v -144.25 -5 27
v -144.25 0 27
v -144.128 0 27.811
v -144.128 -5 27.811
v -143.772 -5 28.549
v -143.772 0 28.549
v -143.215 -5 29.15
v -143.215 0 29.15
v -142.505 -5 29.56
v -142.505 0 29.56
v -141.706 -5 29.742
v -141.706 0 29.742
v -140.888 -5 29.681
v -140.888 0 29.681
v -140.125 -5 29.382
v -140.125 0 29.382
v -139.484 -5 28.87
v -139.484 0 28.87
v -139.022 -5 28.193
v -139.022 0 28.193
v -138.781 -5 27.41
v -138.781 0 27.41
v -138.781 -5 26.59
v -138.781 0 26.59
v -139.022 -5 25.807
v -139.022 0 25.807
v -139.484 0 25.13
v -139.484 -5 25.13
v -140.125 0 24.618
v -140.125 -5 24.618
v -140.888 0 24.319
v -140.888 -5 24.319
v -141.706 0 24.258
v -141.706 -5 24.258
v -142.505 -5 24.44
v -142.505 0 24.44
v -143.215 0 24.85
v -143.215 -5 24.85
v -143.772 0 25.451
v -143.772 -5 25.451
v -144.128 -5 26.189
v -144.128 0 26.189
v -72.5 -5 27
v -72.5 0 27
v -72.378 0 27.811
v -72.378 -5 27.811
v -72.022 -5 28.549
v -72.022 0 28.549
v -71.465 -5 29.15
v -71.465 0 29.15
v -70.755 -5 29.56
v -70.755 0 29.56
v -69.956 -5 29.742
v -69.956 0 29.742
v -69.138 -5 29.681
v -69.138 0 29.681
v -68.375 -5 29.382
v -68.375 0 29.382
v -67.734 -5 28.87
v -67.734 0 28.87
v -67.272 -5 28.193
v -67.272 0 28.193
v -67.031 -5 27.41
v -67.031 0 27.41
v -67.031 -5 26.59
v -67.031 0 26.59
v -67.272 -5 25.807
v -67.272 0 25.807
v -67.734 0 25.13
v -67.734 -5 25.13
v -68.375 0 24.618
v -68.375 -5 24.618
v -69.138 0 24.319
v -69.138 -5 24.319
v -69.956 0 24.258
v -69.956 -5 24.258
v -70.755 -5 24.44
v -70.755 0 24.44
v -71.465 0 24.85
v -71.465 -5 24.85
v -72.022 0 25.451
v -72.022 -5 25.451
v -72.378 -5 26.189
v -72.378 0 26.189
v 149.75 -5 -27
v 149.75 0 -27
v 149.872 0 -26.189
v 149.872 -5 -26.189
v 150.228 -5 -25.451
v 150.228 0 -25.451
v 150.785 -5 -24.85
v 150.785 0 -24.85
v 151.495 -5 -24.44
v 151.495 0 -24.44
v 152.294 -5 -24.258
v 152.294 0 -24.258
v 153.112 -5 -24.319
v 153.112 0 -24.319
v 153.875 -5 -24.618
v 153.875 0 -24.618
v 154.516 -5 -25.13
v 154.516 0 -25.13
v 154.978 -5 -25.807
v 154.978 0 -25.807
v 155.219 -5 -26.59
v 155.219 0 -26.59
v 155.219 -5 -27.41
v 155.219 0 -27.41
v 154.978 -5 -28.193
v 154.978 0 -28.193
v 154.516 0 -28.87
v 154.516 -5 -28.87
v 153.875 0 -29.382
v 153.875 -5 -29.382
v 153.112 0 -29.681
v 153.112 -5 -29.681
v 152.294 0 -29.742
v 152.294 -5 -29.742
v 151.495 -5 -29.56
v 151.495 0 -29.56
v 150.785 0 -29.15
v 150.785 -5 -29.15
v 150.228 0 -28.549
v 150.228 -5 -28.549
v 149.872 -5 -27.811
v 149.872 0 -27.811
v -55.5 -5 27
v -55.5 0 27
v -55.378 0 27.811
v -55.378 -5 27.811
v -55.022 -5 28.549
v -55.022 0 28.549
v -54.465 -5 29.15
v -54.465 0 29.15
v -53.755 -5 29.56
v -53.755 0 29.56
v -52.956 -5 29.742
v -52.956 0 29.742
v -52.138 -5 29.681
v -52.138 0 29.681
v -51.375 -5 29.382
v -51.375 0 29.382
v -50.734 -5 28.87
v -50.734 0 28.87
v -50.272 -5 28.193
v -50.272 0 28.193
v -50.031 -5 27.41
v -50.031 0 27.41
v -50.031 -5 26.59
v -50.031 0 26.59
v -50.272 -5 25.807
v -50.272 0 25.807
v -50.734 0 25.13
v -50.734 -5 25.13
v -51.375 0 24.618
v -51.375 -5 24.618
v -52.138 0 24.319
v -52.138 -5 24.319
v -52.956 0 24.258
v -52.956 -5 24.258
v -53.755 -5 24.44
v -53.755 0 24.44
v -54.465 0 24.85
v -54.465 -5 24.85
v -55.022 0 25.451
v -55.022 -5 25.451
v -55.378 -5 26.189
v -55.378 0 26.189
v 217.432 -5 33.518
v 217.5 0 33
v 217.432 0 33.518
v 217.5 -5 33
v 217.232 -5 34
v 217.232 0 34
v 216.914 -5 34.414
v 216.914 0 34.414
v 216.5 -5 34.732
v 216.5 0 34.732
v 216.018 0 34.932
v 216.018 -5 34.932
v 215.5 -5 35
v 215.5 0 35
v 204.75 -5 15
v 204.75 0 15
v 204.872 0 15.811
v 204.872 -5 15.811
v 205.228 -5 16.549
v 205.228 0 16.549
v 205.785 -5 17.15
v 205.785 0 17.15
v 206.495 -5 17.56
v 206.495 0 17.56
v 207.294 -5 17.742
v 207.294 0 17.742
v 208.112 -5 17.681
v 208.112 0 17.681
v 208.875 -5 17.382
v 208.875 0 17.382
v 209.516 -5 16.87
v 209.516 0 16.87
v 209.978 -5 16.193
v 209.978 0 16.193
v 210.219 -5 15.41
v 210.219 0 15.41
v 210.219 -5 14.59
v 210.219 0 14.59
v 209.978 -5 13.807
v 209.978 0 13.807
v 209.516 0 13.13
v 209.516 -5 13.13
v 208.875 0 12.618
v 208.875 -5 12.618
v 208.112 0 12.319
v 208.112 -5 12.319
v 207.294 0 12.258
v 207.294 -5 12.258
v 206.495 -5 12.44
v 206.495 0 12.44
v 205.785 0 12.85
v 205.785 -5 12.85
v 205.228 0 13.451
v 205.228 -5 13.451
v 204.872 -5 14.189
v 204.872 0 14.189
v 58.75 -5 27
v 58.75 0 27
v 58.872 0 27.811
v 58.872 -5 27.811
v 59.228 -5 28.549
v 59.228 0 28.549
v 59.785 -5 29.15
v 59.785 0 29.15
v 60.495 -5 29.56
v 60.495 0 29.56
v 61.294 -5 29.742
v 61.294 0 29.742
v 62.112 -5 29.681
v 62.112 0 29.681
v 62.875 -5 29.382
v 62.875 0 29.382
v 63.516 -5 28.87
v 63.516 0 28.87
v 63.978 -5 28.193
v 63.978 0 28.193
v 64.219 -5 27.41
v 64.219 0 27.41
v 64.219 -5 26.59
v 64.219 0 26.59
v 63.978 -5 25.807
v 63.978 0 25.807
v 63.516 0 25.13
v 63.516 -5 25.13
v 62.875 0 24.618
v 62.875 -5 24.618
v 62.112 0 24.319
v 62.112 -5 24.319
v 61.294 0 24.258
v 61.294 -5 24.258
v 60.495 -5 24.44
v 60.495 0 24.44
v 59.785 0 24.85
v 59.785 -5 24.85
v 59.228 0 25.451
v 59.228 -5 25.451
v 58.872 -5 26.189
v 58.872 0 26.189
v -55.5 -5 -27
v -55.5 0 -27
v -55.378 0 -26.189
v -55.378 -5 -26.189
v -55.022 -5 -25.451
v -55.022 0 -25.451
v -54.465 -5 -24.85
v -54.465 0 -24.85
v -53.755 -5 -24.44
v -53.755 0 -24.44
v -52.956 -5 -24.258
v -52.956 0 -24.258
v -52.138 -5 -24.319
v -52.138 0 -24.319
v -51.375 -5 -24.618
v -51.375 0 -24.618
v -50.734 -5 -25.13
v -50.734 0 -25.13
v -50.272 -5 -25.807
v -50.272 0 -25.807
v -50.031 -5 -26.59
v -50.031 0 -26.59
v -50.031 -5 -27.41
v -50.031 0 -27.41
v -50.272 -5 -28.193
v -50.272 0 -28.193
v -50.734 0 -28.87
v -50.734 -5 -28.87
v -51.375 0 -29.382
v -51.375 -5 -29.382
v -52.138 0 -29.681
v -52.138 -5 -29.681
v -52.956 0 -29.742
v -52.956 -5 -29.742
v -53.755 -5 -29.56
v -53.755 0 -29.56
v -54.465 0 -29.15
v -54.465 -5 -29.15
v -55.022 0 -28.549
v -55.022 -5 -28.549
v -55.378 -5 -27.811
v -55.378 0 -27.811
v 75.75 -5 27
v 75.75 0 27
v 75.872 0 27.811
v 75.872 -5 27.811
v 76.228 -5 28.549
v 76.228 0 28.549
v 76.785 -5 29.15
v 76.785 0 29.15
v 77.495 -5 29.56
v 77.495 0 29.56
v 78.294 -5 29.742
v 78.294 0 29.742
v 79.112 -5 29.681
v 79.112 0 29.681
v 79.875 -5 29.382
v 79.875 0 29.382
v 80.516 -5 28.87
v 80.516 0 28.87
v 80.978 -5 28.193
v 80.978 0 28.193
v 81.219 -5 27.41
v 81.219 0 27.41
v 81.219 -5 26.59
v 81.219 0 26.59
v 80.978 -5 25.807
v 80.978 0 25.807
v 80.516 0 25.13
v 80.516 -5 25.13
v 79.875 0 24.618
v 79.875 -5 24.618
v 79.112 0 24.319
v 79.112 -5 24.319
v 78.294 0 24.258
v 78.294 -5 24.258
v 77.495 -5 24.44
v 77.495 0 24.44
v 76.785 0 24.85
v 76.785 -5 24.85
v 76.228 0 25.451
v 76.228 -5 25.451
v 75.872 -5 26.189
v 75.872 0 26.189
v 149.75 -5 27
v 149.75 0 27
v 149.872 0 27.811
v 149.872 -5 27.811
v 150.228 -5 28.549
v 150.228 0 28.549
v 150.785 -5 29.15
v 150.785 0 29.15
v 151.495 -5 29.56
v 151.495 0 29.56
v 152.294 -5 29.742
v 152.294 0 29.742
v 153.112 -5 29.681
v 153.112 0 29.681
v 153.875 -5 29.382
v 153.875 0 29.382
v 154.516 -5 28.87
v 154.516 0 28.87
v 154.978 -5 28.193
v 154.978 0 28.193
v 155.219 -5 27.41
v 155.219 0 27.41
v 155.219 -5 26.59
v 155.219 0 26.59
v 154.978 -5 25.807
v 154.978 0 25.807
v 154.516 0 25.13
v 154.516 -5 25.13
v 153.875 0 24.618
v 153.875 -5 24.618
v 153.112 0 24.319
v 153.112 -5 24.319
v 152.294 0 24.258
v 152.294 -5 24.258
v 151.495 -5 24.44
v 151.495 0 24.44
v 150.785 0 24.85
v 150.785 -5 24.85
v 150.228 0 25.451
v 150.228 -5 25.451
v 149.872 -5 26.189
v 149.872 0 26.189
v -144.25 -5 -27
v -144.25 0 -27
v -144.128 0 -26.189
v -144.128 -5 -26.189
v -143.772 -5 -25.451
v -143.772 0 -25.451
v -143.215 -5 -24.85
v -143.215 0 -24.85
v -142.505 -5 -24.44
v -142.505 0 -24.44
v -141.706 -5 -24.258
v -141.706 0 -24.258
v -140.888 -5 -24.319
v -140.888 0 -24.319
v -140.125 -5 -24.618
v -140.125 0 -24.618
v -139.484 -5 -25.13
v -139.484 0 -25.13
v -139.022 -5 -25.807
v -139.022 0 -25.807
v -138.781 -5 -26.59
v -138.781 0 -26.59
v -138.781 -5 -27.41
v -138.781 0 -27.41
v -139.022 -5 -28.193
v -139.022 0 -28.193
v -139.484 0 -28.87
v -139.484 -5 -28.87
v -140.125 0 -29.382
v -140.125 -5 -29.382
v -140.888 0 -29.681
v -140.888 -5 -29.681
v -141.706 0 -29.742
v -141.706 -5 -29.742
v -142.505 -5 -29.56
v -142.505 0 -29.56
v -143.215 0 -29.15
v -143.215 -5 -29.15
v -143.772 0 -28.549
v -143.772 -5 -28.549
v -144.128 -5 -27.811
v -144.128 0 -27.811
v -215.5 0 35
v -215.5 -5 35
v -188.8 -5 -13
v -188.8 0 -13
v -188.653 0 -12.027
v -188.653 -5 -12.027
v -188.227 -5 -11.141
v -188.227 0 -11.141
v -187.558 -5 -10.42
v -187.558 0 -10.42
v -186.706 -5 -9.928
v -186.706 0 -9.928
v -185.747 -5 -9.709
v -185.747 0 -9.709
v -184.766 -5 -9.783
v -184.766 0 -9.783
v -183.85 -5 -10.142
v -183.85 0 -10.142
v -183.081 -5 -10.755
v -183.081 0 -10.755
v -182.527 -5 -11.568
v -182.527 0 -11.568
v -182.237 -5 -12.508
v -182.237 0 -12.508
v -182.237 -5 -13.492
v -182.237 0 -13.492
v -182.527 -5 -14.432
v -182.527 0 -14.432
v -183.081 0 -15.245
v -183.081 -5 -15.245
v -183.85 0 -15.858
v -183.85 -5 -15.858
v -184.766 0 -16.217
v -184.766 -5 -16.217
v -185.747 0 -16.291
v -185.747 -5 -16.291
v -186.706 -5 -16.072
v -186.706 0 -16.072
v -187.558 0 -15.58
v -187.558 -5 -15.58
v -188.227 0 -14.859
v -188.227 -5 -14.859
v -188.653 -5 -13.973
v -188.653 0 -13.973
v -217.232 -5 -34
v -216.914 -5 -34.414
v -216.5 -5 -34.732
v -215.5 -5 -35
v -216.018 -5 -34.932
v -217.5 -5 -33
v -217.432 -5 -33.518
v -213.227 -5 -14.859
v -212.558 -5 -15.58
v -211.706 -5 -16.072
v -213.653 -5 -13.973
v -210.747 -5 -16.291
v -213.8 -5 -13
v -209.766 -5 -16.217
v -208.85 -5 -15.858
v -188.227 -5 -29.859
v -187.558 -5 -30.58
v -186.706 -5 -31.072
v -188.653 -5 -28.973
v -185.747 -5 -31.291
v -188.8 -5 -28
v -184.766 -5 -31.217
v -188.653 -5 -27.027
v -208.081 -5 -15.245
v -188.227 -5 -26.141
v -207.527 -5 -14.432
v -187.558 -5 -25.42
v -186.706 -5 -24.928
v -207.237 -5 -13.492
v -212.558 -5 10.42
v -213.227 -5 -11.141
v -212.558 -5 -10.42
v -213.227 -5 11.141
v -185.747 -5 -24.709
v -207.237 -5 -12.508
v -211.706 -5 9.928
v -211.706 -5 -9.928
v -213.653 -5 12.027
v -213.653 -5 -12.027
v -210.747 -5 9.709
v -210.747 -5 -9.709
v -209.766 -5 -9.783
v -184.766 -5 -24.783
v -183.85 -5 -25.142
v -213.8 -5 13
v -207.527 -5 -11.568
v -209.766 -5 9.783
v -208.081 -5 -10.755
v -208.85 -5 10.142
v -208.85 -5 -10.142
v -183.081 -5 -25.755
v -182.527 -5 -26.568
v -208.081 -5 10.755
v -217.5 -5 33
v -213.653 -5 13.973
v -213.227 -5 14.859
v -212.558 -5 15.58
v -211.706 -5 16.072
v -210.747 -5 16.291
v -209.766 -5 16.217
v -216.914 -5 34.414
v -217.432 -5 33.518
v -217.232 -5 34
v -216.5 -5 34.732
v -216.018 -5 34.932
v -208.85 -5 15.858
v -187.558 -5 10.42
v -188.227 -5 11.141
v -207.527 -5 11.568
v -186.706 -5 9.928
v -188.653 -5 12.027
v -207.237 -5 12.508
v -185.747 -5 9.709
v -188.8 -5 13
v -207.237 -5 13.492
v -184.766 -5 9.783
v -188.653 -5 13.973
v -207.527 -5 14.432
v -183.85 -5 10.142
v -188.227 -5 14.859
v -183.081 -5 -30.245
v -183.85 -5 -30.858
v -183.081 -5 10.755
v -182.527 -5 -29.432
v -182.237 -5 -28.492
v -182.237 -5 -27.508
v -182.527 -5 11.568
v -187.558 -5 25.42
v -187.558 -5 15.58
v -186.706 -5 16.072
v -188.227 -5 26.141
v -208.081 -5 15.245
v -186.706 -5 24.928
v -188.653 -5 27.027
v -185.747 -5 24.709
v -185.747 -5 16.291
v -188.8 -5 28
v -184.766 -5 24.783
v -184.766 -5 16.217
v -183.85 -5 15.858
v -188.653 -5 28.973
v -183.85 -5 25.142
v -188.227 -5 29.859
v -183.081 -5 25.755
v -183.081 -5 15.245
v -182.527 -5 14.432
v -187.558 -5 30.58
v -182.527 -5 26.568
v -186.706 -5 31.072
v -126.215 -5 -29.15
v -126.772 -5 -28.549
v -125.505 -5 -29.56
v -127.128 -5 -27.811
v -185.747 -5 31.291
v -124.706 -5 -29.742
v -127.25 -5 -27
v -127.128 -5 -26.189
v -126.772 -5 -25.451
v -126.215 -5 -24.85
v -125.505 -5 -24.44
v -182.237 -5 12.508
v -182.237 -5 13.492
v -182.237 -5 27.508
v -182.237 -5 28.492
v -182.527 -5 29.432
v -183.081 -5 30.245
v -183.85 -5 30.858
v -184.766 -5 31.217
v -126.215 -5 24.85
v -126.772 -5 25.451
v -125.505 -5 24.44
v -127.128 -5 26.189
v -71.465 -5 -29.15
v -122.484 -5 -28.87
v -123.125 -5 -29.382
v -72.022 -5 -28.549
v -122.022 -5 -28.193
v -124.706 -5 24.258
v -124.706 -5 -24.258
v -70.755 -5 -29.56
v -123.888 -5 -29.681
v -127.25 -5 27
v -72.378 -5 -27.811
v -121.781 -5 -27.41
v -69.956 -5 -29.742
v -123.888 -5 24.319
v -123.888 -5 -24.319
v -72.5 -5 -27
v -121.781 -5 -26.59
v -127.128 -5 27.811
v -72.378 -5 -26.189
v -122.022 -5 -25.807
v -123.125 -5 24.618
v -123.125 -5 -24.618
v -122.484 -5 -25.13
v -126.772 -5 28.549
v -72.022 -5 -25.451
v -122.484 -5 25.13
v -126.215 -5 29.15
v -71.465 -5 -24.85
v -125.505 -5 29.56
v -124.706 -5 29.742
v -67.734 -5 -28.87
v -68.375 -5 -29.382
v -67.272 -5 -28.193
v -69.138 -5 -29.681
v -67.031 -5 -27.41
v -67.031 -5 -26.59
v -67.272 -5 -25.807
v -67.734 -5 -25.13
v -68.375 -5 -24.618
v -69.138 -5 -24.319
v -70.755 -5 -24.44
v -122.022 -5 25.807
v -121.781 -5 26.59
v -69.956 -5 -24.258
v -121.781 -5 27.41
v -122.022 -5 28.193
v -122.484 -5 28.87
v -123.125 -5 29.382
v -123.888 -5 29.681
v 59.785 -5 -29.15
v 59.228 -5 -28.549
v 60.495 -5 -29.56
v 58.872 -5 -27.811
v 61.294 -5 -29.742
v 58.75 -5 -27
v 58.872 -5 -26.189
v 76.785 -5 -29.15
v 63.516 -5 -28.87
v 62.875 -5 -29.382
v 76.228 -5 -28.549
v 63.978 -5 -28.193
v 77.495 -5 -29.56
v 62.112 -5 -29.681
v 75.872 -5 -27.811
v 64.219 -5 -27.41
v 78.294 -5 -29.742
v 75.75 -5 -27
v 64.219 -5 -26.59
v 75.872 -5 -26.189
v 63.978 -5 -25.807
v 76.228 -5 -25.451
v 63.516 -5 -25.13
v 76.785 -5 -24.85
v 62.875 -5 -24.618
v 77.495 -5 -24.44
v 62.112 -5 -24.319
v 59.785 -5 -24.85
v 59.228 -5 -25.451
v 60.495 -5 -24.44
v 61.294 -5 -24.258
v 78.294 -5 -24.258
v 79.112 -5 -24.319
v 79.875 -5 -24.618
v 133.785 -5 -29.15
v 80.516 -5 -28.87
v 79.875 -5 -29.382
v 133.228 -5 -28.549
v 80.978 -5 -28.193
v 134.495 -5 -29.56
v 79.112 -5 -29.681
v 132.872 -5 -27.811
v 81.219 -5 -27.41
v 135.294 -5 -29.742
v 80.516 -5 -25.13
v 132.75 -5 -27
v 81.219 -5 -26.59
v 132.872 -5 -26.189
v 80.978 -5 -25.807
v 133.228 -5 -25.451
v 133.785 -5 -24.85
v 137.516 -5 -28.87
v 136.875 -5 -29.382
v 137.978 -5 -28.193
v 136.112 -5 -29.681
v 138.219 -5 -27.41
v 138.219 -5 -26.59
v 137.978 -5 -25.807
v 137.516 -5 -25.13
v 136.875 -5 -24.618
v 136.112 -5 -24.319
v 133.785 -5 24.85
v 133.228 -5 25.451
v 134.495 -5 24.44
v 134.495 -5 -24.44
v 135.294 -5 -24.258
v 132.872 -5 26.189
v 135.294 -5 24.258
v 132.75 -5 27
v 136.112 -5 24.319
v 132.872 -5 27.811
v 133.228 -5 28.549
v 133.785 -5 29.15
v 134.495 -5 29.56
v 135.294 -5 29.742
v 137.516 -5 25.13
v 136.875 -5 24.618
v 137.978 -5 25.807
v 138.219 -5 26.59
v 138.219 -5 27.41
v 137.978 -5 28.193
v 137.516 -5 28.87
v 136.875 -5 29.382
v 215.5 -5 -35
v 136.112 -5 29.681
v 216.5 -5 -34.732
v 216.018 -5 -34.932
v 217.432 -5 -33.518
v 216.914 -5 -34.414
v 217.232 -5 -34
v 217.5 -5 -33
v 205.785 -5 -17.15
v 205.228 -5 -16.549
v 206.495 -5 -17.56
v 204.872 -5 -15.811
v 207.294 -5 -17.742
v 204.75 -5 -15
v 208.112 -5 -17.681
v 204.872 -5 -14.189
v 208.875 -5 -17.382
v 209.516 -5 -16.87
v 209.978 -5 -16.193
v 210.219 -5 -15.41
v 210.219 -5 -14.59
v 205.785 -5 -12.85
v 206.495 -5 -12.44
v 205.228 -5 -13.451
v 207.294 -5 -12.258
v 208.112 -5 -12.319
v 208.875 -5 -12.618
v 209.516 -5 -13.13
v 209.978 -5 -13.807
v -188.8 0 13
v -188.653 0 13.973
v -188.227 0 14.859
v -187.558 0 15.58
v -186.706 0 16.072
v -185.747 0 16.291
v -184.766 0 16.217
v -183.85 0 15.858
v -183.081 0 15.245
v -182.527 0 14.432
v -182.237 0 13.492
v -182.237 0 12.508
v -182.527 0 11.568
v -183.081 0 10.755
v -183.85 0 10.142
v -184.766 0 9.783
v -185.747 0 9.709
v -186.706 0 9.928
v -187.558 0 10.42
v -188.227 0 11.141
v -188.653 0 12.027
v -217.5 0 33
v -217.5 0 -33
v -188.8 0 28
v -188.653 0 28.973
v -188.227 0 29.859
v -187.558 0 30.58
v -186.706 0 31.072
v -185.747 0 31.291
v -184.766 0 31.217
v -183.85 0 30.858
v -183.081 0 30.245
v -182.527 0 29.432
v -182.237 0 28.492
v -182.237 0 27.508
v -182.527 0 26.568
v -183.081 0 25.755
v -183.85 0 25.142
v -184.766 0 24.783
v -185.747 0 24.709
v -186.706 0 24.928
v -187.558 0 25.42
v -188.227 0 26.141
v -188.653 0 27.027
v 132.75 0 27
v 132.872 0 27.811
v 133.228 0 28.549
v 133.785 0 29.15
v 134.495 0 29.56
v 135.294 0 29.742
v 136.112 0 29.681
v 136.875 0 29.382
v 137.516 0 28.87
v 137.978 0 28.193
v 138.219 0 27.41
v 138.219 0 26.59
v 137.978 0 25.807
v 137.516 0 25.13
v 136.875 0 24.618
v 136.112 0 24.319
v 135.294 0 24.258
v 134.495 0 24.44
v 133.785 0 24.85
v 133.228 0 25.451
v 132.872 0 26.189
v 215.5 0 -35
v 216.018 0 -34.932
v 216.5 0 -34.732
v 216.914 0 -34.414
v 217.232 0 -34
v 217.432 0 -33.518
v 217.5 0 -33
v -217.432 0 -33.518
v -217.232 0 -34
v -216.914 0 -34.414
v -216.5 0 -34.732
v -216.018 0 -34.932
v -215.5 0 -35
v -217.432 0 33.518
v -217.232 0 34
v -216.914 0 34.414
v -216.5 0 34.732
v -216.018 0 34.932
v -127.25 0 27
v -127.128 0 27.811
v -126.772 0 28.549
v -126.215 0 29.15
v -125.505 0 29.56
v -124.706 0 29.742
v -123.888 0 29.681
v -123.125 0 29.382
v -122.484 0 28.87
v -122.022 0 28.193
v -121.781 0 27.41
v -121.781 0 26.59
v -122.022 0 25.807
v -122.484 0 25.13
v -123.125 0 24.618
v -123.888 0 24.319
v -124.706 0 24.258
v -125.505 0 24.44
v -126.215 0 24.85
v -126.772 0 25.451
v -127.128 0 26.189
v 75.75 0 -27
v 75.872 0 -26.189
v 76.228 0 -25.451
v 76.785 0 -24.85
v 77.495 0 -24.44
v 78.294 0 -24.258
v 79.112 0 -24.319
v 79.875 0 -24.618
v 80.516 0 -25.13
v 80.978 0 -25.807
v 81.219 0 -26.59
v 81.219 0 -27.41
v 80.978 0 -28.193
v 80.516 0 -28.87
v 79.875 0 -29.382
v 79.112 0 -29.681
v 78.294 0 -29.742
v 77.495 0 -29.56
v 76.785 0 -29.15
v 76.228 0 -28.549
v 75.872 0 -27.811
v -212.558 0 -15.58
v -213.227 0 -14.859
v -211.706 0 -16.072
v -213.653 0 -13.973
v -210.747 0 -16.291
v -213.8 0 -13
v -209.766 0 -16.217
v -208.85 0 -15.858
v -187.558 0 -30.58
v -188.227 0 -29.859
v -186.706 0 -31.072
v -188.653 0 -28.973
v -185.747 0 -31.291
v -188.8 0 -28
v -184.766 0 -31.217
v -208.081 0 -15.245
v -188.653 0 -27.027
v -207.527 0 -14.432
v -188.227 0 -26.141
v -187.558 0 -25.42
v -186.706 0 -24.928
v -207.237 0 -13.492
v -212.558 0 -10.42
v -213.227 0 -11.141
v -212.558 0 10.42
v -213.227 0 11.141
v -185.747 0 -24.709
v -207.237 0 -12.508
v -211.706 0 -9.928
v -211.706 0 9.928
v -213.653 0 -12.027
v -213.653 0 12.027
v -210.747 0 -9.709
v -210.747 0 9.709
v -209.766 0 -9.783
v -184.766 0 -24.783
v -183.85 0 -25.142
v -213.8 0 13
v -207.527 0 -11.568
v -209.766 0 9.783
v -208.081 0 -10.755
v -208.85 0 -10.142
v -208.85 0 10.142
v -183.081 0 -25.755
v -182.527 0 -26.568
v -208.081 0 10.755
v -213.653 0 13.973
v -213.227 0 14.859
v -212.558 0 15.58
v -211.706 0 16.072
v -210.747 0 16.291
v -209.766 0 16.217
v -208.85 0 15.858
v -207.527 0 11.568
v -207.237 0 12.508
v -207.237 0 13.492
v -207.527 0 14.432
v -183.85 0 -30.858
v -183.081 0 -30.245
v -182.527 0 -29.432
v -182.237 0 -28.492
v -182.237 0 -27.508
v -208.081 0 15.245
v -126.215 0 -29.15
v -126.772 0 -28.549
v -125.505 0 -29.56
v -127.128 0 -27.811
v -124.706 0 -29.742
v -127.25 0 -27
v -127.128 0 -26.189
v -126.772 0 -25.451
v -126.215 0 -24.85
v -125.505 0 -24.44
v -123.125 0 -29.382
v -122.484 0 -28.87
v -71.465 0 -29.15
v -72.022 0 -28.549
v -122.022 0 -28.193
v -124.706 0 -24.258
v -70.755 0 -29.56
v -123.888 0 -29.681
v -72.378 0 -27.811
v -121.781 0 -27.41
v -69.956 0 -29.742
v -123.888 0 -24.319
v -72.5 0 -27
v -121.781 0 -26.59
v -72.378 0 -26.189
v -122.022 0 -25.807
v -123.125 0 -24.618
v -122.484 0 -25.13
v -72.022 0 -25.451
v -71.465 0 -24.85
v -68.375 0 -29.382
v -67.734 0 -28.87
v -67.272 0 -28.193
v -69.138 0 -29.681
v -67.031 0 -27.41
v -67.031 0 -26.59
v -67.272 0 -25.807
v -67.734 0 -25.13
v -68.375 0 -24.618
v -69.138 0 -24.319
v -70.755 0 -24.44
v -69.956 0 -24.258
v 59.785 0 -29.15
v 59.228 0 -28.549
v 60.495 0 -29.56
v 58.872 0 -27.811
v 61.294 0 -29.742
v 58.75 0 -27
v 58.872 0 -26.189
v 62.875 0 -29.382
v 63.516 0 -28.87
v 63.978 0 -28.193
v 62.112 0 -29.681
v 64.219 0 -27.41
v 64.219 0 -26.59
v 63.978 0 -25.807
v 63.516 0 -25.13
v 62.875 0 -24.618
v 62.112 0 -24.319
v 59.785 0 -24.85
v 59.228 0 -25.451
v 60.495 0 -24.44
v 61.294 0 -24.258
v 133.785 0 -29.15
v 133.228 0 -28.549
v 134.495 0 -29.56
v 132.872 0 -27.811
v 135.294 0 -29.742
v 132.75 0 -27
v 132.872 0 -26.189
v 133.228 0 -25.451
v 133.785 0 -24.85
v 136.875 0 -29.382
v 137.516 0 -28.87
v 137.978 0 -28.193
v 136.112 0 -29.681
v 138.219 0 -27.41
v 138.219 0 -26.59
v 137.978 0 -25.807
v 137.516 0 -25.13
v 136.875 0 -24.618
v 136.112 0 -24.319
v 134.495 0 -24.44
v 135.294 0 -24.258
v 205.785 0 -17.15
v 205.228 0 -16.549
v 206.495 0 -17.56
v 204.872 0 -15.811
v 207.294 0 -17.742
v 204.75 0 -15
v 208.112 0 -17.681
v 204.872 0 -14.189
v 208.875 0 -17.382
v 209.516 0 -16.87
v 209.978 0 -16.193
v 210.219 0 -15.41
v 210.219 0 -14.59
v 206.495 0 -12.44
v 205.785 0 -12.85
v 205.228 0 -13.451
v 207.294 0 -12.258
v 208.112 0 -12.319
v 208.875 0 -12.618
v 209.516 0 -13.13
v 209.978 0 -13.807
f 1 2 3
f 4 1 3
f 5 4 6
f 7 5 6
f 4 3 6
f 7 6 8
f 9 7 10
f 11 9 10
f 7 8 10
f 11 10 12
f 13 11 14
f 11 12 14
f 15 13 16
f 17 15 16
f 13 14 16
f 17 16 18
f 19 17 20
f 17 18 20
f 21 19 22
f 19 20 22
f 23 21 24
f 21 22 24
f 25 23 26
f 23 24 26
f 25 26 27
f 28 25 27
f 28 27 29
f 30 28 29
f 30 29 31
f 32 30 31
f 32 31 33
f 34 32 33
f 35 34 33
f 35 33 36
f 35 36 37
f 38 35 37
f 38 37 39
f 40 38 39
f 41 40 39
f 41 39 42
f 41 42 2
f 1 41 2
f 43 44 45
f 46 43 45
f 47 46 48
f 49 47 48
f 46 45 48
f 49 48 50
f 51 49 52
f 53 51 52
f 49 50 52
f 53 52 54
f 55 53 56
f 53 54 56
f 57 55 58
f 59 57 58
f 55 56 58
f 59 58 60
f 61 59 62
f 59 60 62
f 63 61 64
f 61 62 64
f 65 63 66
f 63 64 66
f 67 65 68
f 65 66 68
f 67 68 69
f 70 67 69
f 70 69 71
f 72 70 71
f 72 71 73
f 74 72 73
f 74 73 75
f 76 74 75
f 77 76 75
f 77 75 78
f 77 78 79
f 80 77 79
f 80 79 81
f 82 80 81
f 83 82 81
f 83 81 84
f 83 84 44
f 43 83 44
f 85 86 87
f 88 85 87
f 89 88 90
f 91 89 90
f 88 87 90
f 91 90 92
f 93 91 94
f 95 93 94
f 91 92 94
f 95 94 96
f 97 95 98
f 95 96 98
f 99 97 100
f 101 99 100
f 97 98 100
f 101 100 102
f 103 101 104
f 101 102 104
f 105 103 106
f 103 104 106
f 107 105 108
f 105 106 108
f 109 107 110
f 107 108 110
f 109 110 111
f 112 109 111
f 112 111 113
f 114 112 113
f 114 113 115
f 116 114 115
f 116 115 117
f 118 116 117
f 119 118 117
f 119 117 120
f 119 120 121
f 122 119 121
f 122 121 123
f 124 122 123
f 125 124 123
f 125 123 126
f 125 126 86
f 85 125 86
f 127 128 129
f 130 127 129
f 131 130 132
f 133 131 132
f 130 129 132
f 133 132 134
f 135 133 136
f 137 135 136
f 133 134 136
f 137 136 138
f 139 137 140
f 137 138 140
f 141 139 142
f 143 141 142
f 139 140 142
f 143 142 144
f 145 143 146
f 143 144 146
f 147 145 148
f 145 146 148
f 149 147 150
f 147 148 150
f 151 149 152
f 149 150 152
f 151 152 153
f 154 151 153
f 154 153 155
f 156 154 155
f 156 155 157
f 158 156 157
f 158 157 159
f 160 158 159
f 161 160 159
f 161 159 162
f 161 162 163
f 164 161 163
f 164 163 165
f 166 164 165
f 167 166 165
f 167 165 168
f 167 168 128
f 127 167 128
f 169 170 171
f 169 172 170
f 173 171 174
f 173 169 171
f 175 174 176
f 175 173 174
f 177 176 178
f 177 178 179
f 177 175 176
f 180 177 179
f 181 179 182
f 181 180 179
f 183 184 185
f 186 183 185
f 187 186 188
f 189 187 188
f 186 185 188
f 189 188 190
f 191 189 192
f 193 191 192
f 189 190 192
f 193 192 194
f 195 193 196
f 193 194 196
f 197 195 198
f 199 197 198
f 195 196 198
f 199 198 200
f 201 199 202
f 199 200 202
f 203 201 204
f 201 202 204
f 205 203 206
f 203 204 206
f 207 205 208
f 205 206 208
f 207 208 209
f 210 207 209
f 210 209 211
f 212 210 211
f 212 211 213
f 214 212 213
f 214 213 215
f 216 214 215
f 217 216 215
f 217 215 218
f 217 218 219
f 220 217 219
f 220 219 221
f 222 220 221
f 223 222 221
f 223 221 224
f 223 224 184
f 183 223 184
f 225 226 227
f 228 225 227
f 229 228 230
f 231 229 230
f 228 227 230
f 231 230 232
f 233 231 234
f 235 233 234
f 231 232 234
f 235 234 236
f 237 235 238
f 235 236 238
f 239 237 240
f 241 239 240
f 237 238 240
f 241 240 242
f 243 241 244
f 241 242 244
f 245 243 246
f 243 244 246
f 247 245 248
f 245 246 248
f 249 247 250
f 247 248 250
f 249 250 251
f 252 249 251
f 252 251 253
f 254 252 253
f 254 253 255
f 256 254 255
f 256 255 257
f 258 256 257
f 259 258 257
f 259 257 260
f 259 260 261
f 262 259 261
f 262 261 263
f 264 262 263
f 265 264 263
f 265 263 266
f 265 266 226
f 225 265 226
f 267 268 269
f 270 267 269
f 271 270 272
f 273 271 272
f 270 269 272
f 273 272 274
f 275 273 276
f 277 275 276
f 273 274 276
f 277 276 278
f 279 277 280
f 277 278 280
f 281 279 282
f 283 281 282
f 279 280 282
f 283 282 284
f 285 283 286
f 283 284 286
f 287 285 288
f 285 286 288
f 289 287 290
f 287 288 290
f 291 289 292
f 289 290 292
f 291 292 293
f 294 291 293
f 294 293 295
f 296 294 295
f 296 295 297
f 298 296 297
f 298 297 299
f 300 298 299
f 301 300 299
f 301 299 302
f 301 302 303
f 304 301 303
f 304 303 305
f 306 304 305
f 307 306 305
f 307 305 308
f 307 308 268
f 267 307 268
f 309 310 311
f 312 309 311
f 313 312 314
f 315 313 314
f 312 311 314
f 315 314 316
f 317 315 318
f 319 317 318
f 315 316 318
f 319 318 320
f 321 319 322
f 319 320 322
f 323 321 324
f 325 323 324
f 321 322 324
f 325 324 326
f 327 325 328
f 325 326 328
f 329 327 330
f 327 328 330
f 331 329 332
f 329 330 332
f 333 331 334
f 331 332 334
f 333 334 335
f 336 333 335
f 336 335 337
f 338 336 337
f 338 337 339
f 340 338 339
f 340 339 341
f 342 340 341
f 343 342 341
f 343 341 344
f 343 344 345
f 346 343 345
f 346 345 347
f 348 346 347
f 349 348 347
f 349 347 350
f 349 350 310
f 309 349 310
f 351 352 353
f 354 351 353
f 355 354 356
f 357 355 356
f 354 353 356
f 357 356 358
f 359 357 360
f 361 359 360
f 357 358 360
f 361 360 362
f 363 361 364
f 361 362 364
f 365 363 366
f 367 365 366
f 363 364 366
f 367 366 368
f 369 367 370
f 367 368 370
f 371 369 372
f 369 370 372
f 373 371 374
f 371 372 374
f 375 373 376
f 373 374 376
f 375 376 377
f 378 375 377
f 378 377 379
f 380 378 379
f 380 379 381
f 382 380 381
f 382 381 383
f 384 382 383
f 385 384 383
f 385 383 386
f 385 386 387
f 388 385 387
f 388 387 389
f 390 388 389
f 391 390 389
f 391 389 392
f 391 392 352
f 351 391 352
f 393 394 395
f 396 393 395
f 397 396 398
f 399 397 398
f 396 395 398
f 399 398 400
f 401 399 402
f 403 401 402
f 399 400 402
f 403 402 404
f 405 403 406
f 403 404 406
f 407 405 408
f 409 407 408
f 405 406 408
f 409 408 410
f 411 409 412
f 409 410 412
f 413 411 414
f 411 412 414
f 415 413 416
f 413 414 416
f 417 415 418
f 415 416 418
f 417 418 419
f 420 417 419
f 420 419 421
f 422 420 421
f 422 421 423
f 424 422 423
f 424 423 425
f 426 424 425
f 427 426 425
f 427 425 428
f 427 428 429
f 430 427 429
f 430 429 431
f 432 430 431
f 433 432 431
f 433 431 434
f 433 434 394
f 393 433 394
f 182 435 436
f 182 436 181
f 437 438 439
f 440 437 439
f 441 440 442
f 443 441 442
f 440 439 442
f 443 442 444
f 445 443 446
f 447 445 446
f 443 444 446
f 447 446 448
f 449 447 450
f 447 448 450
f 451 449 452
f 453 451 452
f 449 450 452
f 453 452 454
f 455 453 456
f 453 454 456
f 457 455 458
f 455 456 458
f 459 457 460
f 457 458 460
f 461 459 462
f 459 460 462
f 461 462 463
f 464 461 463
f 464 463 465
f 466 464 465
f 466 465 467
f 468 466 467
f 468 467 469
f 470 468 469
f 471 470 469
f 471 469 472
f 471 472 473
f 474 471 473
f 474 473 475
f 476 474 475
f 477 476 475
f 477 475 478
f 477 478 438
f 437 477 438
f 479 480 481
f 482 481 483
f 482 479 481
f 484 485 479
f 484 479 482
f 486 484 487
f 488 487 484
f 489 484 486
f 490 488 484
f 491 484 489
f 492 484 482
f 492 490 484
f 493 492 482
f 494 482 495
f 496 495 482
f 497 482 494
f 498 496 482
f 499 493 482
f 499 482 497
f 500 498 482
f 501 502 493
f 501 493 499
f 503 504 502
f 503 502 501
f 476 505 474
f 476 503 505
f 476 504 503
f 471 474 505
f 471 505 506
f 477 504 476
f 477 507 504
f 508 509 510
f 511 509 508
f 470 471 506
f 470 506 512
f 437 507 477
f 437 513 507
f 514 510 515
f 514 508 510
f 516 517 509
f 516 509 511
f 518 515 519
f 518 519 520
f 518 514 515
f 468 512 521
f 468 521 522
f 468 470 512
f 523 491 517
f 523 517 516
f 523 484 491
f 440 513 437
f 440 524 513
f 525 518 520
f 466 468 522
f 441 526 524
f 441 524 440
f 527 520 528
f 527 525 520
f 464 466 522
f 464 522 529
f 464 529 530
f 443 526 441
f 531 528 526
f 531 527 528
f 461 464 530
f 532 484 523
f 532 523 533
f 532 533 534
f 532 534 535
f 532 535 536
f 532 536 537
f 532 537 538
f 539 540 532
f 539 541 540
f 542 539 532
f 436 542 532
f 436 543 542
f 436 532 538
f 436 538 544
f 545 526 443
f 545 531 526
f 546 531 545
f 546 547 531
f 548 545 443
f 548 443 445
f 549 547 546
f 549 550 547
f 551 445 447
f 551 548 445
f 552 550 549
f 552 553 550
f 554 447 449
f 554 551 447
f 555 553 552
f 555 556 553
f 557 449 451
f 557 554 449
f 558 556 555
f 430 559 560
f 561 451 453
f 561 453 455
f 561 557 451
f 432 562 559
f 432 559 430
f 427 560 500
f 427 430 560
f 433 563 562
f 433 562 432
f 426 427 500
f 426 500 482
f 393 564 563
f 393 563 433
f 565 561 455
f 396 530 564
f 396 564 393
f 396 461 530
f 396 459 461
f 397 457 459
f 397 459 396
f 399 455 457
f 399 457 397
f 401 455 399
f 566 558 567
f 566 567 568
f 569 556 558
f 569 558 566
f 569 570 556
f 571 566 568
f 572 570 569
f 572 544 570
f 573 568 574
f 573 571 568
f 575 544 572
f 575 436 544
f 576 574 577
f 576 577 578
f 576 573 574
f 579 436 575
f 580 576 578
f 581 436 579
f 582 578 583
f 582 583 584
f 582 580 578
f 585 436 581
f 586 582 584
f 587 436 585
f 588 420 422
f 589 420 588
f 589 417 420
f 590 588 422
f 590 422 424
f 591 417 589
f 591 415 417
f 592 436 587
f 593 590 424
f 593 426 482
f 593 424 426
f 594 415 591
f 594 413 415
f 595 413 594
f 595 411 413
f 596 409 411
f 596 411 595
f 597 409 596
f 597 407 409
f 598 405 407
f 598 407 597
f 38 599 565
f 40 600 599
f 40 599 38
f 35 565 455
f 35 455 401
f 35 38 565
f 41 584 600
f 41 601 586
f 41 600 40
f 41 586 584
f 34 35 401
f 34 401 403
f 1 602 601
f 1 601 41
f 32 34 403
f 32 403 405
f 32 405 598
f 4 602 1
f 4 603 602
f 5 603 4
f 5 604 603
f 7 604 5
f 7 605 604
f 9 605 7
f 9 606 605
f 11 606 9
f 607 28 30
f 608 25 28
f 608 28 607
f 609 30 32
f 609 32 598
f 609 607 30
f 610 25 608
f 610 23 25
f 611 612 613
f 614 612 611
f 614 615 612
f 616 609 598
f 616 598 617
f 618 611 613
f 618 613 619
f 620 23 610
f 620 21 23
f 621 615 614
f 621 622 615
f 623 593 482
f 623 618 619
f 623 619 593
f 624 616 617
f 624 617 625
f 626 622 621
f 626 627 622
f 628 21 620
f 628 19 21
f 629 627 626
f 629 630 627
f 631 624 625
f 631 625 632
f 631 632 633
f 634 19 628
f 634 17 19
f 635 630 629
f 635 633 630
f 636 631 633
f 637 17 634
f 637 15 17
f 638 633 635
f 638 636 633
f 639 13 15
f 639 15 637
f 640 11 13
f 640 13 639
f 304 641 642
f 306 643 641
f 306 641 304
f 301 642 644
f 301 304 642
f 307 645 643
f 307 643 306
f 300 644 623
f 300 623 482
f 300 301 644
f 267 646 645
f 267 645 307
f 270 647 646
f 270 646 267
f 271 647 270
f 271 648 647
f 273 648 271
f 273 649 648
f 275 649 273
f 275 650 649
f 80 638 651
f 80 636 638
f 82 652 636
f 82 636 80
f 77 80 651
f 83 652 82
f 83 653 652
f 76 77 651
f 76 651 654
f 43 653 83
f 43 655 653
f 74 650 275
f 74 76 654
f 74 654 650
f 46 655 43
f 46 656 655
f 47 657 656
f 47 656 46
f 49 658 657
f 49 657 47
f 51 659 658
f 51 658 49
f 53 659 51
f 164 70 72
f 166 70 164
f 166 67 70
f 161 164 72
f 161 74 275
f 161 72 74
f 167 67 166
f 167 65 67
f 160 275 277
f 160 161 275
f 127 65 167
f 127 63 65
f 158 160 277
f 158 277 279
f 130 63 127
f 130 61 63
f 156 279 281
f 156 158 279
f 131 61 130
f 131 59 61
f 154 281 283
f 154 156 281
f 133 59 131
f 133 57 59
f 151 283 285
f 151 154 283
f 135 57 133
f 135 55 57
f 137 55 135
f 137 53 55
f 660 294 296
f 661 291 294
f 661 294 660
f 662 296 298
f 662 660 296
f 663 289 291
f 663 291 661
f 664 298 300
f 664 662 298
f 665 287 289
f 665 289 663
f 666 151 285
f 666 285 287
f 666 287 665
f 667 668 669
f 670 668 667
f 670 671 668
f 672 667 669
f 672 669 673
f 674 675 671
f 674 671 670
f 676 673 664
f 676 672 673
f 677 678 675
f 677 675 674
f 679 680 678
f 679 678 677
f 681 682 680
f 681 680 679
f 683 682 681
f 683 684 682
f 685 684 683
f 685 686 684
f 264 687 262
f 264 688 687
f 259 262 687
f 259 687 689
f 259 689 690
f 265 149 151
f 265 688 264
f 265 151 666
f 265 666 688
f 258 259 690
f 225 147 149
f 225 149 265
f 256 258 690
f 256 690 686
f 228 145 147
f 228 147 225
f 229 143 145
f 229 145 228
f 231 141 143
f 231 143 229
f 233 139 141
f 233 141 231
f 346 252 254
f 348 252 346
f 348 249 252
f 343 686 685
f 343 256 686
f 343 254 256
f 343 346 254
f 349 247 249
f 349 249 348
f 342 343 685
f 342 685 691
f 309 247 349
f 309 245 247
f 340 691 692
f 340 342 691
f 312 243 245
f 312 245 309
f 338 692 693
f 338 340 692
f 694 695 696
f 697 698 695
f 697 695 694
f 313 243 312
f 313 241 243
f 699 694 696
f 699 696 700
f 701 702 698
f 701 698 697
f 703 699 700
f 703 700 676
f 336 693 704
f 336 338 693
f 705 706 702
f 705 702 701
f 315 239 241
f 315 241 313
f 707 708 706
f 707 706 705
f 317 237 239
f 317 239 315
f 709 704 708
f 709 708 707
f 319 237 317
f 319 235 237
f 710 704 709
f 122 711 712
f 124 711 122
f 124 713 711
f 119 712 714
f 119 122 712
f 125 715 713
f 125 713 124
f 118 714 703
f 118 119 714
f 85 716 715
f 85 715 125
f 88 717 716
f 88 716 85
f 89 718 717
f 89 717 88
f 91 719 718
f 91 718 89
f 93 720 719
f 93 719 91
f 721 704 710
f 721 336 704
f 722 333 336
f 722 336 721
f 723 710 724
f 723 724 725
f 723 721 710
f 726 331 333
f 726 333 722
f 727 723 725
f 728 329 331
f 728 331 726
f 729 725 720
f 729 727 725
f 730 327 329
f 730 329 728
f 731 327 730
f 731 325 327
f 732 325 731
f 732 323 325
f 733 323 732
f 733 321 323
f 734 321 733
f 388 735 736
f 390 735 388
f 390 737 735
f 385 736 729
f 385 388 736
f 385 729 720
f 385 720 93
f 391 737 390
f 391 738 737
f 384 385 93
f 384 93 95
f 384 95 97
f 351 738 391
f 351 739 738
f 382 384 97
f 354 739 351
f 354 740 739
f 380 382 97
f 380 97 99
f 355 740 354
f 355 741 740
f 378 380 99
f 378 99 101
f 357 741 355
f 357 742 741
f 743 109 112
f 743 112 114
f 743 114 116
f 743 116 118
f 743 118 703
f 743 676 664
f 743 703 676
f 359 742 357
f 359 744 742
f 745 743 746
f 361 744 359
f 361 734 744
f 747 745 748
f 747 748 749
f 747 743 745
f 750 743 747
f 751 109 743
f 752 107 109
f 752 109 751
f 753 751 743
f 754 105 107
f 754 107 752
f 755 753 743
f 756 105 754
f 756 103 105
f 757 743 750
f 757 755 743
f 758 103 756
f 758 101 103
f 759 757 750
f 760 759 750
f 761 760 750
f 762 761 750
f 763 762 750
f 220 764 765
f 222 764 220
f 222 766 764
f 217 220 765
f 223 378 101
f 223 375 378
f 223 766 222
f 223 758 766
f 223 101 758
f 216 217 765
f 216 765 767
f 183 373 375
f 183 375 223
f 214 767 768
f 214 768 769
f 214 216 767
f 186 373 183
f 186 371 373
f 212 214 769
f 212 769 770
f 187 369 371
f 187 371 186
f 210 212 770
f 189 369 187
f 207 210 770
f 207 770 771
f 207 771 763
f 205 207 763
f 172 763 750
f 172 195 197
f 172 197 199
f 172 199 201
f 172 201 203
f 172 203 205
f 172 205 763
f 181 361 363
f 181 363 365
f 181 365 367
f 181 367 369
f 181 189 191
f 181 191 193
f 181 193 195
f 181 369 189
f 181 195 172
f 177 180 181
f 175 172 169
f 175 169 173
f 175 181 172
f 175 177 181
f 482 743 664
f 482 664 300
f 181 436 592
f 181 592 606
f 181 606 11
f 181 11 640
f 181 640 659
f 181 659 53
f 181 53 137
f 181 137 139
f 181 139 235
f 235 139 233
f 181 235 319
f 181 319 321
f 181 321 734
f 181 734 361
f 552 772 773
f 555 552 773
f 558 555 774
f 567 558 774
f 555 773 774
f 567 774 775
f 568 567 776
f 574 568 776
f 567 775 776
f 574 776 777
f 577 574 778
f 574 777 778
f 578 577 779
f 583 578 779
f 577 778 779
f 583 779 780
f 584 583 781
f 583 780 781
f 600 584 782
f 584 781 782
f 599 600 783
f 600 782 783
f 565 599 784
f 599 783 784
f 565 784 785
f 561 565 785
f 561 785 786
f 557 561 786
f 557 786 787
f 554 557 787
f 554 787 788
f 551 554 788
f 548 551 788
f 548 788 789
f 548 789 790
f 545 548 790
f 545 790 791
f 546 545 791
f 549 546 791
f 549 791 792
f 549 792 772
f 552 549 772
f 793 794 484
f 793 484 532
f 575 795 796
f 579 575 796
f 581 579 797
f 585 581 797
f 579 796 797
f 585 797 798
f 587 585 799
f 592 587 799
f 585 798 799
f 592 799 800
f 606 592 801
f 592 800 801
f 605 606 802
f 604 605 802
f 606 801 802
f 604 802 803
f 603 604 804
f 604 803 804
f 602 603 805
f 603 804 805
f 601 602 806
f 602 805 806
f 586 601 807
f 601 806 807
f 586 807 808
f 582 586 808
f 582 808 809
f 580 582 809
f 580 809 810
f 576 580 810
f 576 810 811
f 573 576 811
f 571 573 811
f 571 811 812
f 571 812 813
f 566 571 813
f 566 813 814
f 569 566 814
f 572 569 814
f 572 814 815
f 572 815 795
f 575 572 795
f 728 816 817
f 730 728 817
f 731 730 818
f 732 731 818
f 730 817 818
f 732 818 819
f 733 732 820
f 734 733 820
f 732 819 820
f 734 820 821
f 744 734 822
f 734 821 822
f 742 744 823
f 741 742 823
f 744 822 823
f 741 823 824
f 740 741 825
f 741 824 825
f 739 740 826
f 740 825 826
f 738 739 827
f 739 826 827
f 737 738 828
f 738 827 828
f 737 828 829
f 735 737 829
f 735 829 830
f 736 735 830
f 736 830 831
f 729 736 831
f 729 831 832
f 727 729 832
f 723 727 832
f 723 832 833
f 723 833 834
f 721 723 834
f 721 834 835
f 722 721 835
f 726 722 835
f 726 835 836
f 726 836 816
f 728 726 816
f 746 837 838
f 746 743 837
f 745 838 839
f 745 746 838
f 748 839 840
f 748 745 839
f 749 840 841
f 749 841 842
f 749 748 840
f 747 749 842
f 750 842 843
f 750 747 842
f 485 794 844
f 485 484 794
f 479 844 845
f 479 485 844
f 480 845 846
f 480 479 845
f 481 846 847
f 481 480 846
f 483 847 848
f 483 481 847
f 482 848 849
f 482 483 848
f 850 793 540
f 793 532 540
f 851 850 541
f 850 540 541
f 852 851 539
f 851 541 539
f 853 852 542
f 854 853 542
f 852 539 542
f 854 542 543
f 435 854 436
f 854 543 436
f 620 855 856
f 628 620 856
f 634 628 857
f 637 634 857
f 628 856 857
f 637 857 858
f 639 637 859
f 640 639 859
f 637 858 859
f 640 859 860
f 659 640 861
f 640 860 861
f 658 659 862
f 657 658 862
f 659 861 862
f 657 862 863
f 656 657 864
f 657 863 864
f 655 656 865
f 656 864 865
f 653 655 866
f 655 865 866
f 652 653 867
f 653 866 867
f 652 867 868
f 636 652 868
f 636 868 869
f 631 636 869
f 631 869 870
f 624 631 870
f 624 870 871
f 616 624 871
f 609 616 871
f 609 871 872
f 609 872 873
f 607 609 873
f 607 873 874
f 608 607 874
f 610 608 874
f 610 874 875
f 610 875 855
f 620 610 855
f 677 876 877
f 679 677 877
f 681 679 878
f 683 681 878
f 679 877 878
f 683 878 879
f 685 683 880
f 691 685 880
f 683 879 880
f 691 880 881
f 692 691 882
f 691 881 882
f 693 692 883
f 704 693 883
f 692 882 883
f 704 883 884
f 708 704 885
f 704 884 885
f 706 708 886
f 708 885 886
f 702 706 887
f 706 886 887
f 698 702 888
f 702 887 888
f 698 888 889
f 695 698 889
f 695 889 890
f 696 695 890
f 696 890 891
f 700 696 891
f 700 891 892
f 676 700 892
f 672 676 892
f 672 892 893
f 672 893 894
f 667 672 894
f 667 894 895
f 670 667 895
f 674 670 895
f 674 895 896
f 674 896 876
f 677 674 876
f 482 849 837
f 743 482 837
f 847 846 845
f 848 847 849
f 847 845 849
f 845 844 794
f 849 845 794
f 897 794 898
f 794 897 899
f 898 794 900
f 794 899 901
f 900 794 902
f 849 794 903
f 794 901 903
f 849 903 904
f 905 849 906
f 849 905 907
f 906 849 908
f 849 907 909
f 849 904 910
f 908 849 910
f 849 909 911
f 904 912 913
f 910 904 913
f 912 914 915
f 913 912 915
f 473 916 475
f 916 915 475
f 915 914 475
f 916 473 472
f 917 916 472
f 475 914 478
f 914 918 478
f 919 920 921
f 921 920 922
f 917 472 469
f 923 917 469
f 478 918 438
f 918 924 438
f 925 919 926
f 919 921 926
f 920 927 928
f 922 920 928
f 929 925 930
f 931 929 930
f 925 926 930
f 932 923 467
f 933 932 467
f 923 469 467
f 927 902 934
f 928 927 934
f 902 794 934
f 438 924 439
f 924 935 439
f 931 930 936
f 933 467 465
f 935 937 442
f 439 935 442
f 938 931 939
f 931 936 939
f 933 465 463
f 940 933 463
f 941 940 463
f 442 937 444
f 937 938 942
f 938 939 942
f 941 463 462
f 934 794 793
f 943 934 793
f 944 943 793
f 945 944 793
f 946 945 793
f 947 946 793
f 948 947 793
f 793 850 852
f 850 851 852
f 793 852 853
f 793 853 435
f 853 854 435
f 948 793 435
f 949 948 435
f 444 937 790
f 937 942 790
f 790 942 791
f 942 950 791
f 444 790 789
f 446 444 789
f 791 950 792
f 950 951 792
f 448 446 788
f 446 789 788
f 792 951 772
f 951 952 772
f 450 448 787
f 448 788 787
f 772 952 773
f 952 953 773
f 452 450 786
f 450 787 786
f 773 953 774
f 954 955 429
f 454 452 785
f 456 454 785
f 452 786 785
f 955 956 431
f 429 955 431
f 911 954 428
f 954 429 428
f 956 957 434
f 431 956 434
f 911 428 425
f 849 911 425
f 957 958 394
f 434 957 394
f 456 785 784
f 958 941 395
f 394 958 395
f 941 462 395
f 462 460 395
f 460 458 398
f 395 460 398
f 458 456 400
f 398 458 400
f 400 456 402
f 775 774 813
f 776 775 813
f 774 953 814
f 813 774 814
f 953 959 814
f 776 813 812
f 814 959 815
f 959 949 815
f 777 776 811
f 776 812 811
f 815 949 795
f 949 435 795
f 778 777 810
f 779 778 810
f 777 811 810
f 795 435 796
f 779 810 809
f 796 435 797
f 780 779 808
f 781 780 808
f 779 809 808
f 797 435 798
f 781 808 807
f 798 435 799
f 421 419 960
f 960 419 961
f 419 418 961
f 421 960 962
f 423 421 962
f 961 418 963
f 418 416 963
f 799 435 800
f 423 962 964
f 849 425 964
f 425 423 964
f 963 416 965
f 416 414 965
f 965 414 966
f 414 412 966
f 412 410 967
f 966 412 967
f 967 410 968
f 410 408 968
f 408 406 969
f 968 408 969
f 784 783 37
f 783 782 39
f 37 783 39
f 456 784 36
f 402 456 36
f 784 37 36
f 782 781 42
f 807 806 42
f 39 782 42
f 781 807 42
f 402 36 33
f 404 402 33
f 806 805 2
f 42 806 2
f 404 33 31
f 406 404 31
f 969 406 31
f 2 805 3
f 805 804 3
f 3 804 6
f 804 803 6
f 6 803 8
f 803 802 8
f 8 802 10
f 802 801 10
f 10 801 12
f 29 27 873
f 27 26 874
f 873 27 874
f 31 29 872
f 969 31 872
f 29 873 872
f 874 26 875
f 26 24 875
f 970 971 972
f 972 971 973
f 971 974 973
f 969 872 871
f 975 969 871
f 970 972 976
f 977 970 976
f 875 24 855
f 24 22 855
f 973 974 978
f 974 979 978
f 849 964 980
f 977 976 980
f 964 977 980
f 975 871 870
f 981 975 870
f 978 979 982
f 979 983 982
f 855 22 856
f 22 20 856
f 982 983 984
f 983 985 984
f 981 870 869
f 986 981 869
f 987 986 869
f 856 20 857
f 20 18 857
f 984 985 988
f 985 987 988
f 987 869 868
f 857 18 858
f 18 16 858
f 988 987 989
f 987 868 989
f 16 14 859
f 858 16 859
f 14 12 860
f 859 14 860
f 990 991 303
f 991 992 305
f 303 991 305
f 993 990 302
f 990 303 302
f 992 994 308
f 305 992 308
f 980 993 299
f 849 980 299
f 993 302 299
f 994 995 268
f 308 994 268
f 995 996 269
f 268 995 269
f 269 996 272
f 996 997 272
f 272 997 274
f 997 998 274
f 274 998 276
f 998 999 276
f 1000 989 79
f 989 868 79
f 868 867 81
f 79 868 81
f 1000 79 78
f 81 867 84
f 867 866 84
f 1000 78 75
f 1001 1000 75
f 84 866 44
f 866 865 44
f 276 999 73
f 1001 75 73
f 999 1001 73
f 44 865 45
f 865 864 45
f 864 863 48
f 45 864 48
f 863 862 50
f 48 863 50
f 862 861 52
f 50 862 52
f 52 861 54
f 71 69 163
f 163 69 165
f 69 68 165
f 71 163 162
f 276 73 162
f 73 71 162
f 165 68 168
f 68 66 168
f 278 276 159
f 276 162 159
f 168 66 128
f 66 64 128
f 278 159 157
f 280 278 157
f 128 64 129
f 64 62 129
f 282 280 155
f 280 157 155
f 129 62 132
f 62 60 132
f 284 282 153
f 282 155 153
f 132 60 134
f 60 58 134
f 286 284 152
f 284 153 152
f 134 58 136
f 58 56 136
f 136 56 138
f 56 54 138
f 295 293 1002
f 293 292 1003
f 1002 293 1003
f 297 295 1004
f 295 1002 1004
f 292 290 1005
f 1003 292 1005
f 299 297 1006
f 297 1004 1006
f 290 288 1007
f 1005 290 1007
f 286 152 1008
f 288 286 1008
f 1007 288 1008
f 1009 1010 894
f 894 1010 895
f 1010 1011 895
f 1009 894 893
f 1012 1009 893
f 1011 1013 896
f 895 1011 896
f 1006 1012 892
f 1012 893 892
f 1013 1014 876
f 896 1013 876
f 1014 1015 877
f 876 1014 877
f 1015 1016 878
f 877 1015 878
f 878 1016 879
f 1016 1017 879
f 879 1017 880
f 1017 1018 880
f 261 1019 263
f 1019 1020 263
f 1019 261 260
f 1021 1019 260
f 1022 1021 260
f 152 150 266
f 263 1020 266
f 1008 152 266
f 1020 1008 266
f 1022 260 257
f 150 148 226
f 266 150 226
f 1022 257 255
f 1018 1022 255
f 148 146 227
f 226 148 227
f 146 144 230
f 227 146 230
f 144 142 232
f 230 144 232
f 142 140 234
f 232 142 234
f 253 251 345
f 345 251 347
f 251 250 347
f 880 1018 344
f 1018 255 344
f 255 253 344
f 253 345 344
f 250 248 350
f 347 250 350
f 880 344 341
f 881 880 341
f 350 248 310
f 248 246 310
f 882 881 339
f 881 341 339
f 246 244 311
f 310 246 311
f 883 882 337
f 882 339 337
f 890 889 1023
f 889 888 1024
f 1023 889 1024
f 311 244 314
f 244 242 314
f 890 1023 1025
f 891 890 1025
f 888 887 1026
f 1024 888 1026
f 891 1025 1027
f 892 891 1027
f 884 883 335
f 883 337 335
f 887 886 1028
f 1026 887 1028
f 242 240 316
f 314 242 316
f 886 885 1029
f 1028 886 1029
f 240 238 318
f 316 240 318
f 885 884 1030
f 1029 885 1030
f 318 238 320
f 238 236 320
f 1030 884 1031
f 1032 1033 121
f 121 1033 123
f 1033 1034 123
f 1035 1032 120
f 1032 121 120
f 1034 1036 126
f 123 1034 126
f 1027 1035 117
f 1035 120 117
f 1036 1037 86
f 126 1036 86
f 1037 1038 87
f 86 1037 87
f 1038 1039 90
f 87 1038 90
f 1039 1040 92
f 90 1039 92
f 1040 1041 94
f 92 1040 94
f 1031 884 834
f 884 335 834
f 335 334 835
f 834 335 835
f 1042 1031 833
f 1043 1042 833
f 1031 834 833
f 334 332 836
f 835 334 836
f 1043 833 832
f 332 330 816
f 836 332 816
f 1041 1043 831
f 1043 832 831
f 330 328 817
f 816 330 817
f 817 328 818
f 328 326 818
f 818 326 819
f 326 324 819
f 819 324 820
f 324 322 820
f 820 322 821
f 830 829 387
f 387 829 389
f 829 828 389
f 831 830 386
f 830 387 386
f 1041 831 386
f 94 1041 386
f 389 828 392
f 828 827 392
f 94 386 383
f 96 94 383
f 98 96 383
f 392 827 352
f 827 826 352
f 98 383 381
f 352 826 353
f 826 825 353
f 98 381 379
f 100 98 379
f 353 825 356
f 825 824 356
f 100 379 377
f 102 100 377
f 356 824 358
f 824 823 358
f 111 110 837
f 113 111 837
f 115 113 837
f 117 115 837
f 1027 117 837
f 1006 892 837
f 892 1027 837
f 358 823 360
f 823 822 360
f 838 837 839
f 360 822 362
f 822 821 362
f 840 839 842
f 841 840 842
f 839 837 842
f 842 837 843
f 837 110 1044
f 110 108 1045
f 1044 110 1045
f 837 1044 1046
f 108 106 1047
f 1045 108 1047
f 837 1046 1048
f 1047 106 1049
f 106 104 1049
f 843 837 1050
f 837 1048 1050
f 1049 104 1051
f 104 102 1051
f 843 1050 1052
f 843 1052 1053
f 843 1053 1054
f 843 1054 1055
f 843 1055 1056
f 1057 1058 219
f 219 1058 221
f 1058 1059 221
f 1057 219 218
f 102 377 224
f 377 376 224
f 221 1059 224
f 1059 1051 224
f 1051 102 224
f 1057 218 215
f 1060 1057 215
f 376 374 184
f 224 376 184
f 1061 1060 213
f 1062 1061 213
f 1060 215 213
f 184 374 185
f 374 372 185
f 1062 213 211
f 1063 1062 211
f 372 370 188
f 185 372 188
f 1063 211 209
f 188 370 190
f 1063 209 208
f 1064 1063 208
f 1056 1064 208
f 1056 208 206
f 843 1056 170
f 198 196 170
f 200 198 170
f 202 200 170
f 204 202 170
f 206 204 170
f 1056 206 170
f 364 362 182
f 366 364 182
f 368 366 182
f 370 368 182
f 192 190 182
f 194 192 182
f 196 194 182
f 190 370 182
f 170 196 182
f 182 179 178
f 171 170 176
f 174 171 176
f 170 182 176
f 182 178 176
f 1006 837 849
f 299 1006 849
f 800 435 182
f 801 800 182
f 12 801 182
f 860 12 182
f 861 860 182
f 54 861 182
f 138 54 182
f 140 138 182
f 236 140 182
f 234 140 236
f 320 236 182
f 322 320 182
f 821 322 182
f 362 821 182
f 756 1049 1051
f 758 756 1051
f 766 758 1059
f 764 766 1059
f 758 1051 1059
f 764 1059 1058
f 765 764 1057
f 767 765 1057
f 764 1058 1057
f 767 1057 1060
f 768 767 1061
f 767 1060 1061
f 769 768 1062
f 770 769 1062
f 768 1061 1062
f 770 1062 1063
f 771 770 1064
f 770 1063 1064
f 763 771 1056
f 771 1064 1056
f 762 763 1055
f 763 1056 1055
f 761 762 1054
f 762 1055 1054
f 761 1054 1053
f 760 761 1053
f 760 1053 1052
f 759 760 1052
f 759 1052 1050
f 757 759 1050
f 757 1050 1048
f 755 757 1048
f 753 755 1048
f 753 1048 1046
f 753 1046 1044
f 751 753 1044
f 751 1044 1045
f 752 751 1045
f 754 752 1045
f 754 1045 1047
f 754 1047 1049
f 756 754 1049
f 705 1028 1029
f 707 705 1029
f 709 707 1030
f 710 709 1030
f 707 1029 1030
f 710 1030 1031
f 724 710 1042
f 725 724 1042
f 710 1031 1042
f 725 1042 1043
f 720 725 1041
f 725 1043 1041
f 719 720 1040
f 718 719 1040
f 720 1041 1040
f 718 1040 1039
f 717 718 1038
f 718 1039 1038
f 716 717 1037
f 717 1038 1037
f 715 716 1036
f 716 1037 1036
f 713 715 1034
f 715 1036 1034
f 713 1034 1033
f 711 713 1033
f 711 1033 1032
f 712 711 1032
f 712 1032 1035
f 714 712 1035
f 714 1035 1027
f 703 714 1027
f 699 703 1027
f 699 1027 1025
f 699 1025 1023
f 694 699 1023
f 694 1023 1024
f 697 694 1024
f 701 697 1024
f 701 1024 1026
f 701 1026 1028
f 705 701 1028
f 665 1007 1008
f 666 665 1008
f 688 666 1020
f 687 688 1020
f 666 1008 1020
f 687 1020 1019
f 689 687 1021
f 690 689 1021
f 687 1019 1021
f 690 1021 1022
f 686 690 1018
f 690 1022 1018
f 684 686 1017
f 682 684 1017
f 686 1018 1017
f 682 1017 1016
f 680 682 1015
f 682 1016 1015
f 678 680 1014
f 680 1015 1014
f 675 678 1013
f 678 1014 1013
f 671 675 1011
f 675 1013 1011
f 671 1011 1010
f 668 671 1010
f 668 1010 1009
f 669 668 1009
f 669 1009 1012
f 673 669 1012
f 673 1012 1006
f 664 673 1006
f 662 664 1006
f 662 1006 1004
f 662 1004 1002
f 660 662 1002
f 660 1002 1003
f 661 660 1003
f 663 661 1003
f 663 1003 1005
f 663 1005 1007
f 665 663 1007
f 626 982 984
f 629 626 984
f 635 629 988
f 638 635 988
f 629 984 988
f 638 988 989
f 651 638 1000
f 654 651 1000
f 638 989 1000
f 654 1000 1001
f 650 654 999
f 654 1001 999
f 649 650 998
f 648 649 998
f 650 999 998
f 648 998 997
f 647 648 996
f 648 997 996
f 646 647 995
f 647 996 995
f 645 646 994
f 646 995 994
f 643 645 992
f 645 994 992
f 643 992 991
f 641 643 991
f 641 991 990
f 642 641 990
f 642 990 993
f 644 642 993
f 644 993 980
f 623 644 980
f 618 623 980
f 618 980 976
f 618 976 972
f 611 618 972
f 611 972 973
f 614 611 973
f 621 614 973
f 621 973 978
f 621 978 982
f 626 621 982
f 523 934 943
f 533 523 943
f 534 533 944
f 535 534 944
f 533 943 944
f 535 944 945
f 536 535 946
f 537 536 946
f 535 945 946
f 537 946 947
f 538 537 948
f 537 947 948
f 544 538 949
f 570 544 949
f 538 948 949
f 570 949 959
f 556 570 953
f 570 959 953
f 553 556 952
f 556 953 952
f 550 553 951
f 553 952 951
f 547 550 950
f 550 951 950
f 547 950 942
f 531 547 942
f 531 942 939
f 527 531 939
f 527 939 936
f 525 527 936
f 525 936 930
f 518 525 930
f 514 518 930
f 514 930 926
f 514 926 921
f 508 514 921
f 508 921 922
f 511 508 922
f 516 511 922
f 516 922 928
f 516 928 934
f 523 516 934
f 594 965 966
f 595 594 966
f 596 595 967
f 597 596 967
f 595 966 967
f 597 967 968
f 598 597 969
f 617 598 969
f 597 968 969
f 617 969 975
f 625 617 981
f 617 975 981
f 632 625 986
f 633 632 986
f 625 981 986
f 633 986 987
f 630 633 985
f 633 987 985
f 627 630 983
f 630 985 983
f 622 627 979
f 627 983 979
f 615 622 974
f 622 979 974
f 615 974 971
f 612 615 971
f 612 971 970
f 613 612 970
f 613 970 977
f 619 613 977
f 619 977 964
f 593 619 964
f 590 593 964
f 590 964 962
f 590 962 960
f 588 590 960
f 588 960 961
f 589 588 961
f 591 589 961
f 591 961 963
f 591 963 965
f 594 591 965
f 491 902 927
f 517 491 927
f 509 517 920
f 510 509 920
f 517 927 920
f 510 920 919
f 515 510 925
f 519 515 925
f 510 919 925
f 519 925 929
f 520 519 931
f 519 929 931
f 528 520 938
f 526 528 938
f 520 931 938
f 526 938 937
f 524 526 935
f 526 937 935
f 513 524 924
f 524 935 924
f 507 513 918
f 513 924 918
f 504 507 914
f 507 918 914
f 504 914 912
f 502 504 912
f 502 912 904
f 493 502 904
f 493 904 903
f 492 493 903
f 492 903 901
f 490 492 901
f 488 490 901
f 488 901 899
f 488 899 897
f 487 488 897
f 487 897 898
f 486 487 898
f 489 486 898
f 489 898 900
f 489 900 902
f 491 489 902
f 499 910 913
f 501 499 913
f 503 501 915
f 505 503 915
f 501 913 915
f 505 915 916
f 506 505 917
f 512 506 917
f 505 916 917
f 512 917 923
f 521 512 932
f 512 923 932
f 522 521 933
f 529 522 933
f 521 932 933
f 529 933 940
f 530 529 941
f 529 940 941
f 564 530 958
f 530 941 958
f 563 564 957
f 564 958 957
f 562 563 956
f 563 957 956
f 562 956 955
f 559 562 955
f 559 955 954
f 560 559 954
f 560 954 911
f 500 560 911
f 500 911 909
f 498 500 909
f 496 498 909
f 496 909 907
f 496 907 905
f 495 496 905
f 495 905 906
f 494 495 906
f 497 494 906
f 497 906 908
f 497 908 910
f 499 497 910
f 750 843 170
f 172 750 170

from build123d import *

# Parameters (mm, degrees)
F0_W     = 435
F0_H     = 70
F1_DEPTH = 5
F2_R     = 2
F4_D     = 6.6
F6_D     = 5.5
F8_D     = 5.5
F10_D    = 5.5


# Not quite as in the source:
# - a feature names something its author has since deleted; it is built from what else it names


with BuildPart() as f1:
    # F0 (on Front) → F1 (new body)
    with BuildSketch(Plane.XZ):
        Rectangle(F0_W, F0_H)
    extrude(amount=F1_DEPTH)

    # F2
    f2_edges = [f1.edges().sort_by_distance(p)[0] for p in [
        (217.5, -2.5, 35),
        (217.5, -2.5, -35),
        (-217.5, -2.5, 35),
        (-217.5, -2.5, -35),
    ]]
    fillet(f2_edges, radius=F2_R)

    # F4 (through all)
    with Locations(Plane.XZ.offset(5)):
        with Locations((-185.5, 13), (-210.5, 13), (-210.5, -13), (-185.5, -13), (-185.5, 28), (-185.5, -28)):
            Hole(F4_D / 2)

    # F6 (through all)
    with Locations(Plane.XZ.offset(5)):
        with Locations((-141.5, 27), (-124.5, 27), (-141.5, -27), (-124.5, -27)):
            Hole(F6_D / 2)

    # F8 (through all)
    with Locations(Plane.XZ.offset(5)):
        with Locations((-69.75, 27), (-52.75, 27), (-69.75, -27), (-52.75, -27), (61.5, 27), (78.5, 27), (61.5, -27), (78.5, -27), (135.5, 27), (152.5, 27), (135.5, -27), (152.5, -27)):
            Hole(F8_D / 2)

    # F10 (through all)
    with Locations(Plane.XZ.offset(5)):
        with Locations((207.5, 15), (207.5, -15)):
            Hole(F10_D / 2)


solid = f1.part
